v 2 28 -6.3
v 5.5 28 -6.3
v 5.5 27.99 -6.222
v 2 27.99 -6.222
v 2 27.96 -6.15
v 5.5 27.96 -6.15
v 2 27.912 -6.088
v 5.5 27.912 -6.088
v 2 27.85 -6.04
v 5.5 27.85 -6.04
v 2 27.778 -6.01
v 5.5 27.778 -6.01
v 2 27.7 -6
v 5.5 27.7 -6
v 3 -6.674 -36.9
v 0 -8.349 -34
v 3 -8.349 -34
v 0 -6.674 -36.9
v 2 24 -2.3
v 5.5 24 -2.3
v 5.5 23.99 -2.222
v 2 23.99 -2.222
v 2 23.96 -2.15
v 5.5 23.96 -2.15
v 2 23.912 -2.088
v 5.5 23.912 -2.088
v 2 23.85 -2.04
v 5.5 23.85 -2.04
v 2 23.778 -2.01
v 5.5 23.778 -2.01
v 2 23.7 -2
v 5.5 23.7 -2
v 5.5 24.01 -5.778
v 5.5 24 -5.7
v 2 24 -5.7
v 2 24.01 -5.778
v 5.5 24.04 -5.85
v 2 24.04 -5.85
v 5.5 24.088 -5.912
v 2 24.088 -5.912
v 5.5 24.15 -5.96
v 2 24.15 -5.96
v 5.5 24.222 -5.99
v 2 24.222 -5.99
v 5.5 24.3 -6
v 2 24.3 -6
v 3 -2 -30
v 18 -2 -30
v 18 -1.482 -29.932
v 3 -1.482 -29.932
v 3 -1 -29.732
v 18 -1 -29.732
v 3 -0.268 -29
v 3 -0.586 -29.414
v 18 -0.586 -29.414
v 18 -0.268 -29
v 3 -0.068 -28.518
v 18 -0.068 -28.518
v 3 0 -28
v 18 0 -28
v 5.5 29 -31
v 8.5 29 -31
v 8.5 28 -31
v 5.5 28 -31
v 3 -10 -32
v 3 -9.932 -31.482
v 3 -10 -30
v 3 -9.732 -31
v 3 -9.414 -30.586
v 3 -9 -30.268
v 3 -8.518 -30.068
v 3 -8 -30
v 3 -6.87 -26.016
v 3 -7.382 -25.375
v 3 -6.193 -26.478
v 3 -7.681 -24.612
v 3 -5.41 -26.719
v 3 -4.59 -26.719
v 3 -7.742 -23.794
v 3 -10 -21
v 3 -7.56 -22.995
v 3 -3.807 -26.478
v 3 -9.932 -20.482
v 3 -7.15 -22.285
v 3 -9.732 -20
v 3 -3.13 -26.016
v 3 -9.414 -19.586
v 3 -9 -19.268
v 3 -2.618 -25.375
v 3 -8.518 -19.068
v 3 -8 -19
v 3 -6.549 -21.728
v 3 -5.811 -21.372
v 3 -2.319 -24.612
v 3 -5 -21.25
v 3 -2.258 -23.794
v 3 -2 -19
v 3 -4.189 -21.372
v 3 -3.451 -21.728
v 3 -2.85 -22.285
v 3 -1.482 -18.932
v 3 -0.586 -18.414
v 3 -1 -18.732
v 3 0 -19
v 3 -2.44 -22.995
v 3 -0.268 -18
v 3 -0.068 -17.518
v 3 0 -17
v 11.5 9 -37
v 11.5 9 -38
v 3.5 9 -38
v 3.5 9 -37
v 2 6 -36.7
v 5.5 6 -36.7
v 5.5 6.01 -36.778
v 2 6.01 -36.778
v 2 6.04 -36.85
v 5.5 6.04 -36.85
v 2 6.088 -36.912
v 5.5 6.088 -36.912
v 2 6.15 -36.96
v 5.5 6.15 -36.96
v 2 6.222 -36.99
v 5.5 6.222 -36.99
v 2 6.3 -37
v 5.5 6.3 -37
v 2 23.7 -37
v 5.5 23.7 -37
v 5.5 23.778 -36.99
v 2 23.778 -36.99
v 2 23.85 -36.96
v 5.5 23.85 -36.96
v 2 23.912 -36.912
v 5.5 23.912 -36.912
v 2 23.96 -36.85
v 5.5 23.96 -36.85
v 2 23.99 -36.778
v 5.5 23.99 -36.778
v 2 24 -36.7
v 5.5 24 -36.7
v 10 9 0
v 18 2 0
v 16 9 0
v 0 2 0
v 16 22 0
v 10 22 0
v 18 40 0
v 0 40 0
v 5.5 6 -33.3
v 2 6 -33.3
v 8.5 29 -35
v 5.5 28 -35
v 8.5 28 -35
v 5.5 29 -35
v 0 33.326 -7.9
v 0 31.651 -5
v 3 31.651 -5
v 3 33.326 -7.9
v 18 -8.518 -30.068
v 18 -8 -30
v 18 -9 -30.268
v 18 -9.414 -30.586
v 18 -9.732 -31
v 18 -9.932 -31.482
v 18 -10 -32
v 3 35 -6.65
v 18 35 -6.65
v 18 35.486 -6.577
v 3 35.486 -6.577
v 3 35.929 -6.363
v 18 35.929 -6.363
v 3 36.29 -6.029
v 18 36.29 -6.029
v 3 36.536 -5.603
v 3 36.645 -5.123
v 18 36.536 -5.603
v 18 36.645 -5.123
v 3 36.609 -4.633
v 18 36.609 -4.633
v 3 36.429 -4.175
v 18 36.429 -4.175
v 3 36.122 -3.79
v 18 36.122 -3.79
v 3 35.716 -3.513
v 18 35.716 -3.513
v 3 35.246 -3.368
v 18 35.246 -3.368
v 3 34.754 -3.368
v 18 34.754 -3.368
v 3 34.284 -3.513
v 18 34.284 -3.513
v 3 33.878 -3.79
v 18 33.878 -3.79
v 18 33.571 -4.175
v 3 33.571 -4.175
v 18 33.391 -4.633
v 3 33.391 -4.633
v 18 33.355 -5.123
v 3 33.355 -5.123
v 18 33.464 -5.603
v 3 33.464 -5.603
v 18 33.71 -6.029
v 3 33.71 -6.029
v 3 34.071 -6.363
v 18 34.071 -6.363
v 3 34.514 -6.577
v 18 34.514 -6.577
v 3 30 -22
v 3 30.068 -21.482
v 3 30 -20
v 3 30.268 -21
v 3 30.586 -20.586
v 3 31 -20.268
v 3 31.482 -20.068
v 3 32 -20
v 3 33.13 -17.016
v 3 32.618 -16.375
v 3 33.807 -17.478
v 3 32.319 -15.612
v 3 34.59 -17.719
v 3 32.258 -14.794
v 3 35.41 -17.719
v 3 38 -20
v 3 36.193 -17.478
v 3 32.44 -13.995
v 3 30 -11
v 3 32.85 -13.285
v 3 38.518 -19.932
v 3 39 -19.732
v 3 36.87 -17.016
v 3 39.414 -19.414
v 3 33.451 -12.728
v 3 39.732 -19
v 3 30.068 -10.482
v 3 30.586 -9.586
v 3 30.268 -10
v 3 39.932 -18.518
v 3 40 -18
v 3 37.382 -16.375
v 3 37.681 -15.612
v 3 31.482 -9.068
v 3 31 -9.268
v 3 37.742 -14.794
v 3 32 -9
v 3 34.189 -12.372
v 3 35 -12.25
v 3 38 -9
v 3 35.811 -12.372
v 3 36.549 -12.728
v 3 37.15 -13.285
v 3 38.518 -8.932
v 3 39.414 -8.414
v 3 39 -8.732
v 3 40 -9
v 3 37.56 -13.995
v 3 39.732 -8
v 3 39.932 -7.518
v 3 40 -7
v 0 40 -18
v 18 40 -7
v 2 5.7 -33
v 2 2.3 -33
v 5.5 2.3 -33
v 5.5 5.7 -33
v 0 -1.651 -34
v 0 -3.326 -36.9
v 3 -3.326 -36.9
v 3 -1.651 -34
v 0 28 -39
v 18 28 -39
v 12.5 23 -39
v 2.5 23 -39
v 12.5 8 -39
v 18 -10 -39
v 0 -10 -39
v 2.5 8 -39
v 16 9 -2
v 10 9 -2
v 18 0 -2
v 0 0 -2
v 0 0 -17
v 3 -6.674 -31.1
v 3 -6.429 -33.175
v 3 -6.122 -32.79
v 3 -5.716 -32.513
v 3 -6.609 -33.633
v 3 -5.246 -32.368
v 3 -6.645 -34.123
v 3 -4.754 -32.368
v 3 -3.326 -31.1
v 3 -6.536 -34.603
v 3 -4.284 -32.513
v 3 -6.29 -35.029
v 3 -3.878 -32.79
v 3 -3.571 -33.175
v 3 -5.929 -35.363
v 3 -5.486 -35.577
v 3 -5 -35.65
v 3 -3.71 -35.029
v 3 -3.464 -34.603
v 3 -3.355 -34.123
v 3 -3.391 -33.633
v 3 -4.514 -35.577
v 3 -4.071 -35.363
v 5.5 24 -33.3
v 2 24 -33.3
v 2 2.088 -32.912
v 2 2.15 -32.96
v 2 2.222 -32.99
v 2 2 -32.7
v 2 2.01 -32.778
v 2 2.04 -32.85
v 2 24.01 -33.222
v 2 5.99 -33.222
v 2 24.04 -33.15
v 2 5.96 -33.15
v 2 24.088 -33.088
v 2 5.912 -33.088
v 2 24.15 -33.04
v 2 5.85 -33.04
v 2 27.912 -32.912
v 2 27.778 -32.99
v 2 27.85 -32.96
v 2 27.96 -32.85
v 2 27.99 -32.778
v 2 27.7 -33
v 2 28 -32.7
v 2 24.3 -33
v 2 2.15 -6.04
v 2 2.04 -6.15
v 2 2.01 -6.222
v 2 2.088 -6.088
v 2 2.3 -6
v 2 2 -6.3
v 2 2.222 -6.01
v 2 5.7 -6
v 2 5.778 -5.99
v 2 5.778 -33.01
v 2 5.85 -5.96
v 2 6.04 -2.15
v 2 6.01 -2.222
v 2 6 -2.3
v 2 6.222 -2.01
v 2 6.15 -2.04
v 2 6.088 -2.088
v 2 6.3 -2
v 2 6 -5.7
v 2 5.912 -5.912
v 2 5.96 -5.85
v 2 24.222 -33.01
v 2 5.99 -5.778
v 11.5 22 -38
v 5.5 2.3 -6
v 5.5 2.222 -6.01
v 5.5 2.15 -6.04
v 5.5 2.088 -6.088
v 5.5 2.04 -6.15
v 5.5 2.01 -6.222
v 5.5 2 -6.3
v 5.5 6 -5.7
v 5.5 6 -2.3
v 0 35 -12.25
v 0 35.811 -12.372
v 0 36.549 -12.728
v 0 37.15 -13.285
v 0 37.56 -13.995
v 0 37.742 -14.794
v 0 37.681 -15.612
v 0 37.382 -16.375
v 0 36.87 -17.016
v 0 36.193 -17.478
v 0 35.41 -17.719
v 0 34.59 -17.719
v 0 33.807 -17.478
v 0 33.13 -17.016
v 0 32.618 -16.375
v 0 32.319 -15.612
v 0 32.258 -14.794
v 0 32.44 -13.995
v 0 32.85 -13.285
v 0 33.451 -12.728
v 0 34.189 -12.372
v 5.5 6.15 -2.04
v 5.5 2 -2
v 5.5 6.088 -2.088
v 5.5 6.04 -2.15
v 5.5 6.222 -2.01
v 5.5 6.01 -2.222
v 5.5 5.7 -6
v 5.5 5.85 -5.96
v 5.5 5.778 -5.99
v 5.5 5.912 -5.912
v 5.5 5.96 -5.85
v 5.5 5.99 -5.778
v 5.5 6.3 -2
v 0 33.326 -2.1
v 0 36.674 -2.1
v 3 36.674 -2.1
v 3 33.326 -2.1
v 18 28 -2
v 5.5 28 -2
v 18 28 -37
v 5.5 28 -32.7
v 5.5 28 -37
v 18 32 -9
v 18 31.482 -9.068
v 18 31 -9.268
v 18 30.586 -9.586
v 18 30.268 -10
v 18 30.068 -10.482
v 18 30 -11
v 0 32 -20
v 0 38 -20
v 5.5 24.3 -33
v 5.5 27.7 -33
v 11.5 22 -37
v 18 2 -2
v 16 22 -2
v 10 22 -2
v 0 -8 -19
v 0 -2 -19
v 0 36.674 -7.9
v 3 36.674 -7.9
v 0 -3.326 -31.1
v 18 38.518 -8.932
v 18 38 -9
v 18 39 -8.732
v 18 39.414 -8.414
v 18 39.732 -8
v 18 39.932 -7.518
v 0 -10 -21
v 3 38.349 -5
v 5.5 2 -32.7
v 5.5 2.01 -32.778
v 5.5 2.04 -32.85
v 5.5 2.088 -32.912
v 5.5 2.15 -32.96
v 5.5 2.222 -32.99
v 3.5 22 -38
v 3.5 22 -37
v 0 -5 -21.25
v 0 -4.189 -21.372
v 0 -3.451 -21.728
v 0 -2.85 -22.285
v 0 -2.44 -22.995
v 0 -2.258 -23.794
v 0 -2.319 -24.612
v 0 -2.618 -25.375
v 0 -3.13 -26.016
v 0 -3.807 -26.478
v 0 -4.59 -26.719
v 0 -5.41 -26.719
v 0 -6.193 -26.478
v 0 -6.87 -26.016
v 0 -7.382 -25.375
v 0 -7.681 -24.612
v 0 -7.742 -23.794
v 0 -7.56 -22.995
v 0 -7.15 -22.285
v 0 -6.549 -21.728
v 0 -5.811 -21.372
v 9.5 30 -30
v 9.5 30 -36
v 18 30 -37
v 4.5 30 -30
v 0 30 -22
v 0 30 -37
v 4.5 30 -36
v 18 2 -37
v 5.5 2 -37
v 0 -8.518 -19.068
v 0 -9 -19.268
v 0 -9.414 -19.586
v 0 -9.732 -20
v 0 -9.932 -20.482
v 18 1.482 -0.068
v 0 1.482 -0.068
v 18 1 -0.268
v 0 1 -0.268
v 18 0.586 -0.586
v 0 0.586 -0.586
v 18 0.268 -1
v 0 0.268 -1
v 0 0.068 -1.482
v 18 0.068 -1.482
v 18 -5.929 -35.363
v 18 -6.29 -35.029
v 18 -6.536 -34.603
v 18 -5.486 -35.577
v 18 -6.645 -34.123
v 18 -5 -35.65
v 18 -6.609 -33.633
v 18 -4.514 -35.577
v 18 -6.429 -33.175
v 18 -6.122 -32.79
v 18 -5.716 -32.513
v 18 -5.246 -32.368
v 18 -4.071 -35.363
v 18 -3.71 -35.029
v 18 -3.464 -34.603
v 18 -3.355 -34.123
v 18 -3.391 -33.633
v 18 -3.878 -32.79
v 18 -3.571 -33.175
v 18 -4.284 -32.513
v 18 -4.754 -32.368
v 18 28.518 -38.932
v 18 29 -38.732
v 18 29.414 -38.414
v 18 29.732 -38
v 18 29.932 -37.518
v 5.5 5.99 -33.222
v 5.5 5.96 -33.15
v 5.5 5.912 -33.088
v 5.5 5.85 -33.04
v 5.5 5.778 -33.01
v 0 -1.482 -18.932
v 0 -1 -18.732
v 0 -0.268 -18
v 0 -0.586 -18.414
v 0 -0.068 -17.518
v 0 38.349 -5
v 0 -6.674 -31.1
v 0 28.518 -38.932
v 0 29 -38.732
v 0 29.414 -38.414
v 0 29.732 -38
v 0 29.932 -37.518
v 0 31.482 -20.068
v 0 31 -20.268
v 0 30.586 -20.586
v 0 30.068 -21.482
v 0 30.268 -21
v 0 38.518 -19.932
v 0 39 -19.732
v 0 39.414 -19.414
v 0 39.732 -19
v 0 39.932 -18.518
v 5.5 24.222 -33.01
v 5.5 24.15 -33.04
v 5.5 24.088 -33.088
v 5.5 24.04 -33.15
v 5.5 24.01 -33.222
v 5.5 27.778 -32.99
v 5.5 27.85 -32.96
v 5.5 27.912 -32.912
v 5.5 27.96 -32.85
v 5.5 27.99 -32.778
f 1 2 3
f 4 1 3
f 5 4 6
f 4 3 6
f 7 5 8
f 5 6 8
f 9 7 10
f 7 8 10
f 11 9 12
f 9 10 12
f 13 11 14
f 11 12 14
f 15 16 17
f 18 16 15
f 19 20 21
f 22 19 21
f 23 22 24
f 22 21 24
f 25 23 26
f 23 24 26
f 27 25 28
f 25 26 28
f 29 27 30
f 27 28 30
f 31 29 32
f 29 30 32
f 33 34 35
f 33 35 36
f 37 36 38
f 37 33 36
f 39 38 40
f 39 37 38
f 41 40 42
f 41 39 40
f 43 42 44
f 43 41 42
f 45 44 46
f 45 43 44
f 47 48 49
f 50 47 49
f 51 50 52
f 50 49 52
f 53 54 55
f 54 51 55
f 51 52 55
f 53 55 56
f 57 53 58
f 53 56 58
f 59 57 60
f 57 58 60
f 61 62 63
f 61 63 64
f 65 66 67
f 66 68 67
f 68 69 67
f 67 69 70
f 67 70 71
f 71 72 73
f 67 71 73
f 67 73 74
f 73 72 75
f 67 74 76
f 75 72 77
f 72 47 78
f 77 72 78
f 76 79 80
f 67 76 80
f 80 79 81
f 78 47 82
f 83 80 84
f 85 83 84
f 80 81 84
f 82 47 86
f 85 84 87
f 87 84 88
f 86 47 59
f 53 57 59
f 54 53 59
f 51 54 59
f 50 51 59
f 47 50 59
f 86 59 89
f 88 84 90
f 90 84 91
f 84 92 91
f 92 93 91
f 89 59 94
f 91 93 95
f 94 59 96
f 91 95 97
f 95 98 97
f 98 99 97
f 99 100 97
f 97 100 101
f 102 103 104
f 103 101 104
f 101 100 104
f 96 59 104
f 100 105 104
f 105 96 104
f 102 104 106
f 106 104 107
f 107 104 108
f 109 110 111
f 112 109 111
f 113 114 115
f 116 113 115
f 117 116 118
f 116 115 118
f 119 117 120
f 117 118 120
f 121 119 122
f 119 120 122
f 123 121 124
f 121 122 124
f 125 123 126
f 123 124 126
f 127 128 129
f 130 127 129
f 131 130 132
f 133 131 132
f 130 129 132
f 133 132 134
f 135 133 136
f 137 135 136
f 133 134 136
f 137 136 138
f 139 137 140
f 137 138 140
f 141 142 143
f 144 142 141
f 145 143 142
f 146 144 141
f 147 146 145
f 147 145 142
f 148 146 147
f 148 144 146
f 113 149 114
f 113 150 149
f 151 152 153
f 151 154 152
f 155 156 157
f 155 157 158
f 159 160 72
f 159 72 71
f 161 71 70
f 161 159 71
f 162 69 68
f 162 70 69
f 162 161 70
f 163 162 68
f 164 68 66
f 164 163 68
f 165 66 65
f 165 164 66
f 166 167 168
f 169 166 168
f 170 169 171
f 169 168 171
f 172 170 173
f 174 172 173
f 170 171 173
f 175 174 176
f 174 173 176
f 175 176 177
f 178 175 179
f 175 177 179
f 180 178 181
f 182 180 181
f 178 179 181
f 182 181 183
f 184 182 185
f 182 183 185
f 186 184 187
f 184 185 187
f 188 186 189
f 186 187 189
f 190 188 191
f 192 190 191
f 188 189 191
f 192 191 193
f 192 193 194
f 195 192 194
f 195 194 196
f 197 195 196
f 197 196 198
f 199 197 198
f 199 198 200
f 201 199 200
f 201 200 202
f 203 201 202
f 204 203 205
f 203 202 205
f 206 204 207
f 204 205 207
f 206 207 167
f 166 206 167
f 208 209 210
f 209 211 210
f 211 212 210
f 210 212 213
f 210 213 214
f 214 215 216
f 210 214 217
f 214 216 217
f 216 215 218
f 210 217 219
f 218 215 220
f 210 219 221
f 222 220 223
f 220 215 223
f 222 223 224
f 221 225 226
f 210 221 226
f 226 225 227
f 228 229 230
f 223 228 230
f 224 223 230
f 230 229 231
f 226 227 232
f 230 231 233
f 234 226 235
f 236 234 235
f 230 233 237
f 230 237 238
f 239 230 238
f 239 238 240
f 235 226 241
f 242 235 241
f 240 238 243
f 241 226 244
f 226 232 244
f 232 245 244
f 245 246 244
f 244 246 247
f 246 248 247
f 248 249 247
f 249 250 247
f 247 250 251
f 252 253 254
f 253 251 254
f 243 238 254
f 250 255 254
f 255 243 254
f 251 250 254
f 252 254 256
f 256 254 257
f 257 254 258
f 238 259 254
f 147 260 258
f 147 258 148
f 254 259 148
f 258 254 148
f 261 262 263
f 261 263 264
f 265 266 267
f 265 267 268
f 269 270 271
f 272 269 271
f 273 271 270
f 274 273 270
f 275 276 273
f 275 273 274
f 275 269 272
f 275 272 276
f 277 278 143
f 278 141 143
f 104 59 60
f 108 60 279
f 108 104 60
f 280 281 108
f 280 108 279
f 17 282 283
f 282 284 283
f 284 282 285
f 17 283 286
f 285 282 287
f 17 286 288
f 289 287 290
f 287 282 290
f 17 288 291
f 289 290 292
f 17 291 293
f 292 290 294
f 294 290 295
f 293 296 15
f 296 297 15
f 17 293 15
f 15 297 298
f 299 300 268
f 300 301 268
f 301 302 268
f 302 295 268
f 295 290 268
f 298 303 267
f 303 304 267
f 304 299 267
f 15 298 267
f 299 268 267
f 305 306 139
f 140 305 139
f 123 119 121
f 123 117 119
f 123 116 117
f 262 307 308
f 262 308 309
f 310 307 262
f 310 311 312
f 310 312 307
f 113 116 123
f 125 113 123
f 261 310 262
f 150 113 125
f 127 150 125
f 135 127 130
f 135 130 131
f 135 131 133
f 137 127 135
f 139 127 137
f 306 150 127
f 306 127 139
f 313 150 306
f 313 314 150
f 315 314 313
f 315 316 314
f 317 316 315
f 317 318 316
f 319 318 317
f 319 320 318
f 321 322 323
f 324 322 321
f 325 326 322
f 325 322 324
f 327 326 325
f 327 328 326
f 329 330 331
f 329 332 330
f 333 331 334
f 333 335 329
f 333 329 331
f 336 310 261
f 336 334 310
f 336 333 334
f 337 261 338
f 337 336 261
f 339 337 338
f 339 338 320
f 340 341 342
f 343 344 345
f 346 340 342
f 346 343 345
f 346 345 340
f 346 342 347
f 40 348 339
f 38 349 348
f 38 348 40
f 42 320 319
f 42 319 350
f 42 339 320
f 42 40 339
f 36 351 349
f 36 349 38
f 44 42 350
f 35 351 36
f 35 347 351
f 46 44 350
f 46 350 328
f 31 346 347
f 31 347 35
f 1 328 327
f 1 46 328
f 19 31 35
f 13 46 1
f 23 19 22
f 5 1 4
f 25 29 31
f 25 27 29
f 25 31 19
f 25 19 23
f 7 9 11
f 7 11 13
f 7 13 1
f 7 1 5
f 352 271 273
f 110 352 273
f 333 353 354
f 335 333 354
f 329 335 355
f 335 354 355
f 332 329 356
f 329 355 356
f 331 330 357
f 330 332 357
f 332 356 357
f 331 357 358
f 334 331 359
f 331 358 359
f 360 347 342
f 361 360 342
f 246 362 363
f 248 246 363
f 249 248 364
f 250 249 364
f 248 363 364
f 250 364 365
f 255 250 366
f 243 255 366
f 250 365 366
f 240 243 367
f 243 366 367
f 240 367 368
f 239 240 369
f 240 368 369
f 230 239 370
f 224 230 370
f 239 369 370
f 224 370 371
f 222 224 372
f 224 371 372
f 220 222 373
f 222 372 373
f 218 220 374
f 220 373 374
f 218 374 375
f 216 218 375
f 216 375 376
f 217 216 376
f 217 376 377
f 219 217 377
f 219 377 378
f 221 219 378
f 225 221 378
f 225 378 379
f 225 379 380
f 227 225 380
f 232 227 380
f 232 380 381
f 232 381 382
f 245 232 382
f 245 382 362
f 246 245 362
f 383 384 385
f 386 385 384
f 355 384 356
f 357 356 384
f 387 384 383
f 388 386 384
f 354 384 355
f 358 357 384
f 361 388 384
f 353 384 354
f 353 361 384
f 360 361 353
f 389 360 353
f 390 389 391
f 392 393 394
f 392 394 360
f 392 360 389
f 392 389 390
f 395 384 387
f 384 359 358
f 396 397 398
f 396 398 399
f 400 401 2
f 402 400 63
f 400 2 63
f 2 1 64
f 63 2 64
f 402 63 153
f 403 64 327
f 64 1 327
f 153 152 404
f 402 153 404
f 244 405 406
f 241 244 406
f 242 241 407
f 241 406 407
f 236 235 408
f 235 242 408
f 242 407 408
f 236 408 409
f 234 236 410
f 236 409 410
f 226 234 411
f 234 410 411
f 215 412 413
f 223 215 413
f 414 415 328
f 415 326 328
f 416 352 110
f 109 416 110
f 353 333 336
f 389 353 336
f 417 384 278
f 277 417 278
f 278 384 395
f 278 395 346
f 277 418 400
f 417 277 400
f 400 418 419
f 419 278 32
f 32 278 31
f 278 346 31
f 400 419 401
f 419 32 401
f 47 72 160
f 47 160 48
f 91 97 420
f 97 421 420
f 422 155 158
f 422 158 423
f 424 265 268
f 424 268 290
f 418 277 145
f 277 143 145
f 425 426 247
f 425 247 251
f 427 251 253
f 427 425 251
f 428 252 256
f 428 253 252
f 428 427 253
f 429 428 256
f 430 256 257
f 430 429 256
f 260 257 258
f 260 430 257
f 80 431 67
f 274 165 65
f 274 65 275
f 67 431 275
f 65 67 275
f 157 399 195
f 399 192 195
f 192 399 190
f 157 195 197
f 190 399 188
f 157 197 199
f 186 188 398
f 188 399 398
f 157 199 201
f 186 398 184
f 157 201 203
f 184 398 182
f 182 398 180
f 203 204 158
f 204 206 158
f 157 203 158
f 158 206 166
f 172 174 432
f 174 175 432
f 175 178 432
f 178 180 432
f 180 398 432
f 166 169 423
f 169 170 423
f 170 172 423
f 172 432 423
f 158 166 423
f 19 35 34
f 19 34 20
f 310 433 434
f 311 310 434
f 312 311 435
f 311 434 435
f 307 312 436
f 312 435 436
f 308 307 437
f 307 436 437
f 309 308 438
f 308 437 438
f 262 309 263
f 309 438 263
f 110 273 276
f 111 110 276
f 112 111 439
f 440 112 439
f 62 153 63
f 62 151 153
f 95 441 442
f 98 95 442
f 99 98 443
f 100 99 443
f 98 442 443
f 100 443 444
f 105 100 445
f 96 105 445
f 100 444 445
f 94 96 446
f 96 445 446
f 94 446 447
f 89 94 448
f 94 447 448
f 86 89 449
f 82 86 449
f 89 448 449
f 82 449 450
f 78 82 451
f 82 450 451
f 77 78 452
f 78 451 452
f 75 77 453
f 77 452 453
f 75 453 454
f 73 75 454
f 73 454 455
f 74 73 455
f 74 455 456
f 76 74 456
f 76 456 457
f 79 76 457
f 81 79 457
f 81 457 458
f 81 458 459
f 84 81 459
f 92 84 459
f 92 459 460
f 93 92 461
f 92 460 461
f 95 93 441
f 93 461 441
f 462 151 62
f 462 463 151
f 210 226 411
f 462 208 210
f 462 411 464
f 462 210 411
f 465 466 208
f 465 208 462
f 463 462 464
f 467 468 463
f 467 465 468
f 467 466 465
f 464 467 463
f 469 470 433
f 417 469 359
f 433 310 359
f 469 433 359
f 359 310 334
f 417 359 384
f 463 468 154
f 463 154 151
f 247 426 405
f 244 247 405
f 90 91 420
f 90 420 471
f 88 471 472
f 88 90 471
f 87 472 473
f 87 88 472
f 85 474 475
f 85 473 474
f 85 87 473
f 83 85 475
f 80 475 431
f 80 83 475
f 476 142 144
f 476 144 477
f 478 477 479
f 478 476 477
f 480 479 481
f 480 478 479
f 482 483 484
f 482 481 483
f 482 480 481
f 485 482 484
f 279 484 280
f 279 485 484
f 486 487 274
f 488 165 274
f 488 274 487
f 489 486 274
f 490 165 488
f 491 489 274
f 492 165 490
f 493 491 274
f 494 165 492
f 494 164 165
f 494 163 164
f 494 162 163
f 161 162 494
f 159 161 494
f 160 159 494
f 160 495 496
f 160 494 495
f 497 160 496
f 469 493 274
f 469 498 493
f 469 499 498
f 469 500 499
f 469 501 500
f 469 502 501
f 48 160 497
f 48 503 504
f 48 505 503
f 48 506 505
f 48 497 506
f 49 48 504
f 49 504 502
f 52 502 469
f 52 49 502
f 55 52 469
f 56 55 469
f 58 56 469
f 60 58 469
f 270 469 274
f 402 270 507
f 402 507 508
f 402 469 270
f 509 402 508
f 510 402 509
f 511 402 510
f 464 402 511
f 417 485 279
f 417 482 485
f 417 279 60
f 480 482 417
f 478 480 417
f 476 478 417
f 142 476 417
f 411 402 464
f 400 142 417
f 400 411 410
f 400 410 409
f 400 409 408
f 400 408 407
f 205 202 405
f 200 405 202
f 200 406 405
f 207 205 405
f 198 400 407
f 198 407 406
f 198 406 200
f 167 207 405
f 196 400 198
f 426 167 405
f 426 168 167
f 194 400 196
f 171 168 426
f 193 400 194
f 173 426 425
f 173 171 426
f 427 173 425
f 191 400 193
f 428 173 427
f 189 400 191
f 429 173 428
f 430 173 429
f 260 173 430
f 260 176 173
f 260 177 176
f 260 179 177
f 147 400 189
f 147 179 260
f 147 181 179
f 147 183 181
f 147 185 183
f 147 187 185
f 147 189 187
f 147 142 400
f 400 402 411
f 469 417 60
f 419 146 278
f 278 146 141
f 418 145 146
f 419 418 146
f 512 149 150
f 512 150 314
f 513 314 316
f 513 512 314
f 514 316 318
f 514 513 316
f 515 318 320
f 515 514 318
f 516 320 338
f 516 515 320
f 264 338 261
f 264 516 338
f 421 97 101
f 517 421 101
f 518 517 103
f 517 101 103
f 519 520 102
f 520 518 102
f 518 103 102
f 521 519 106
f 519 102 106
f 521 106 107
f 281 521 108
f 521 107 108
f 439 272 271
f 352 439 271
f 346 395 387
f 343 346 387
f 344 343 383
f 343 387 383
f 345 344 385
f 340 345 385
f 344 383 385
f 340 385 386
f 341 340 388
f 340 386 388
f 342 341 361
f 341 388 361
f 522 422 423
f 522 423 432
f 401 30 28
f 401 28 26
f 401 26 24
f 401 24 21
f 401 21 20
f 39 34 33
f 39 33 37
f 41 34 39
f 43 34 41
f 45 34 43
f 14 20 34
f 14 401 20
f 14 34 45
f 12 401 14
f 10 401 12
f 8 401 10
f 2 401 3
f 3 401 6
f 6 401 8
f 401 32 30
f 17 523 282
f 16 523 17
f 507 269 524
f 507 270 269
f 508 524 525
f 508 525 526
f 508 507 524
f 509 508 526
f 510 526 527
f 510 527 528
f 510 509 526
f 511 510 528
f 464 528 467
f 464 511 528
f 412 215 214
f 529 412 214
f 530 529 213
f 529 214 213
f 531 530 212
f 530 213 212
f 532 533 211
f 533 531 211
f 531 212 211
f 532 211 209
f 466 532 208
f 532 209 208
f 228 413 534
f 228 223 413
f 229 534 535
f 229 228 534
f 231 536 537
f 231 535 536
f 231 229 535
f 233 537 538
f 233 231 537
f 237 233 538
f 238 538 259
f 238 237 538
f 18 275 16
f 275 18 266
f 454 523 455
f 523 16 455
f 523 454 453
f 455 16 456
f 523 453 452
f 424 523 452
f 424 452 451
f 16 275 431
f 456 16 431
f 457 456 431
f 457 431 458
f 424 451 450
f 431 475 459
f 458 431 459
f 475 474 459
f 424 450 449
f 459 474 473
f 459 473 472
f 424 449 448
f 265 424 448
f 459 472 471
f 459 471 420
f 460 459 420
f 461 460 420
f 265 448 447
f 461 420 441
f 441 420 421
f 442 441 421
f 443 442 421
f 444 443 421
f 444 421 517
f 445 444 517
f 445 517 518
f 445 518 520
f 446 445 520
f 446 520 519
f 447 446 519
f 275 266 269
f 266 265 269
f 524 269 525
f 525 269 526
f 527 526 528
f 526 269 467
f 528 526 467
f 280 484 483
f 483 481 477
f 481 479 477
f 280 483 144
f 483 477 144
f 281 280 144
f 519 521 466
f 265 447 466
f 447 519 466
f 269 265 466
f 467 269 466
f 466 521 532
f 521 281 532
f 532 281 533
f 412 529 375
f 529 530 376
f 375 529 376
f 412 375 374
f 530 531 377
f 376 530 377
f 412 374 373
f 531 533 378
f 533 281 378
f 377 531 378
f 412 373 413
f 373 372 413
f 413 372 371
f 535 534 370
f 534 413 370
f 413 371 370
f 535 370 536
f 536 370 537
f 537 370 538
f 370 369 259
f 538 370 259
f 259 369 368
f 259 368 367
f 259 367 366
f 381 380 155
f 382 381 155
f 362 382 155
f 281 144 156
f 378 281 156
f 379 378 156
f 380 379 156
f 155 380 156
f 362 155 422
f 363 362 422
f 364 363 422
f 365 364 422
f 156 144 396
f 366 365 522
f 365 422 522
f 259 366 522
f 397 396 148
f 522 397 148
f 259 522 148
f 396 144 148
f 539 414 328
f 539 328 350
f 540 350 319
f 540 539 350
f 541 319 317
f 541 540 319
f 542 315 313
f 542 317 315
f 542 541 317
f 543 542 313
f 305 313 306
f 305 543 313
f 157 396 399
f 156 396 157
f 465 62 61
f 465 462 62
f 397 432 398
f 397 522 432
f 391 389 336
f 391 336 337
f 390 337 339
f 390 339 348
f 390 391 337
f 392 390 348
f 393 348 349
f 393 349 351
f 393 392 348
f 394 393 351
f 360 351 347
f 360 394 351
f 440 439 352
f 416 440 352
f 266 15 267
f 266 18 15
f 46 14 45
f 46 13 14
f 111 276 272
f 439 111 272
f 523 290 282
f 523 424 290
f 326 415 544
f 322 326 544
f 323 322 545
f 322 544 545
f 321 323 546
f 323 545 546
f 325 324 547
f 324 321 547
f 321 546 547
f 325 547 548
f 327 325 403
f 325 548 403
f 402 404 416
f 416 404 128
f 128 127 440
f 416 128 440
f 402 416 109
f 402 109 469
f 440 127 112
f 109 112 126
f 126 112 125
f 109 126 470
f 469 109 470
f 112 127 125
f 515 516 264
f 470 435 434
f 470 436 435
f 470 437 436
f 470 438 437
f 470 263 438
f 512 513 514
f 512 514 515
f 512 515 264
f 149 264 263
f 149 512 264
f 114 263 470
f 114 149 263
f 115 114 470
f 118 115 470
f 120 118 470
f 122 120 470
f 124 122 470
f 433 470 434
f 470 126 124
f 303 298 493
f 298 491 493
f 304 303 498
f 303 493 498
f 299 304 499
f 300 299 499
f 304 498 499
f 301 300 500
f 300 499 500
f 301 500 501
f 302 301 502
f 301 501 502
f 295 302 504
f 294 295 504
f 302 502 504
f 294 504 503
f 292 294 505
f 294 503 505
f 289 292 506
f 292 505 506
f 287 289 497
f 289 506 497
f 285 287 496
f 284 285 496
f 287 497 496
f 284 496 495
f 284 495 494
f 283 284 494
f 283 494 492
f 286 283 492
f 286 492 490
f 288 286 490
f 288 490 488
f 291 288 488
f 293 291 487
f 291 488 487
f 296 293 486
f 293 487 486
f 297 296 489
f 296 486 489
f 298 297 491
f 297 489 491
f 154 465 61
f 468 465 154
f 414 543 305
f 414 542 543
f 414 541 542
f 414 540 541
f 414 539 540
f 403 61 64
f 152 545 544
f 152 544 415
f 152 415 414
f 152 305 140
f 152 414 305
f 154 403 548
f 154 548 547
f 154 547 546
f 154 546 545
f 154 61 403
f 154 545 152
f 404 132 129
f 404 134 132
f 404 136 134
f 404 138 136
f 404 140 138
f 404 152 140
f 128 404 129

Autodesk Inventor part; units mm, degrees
ref_plane "YZ Plane" through (0, 0, 0) normal (1, 0, 0) x (0, 1, 0)
ref_plane "XZ Plane" through (0, 0, 0) normal (0, 1, 0) x (-1, 0, 0)
ref_plane "XY Plane" through (0, 0, 0) normal (0, 0, 1) x (1, 0, 0)
sketch "Skizze1" plane through (0, 0, 0) normal (1, 0, 0) x (0, 1, 0)
  line L0 (0, 0) -> (30, 0)
  line L1 (30, 0) -> (30, -39)
  line L2 (30, -39) -> (0, -39)
  line L3 (0, -39) -> (0, 0)
  dimension "d0" = 39
  dimension "d1" = 30
extrude "Extrusion1" add sketch "Skizze1" along normal blind 18
shell "Wandung1" thickness 2 removed faces 1 at (18, 10, -13)
sketch "Skizze2" plane through (2, 2, -37) normal (1, 0, 0) x (0, 0, -1)
  line L0 (-35, 26) -> (-35, 0) projected
  line L1 (-35, 26) -> (-31, 26)
  line L2 (-31, 26) -> (-31, 22)
  line L3 (-31, 22) -> (-35, 22)
  line L4 (-35, 22) -> (-35, 26)
  line L5 (0, 26) -> (0, 0) projected
  line L6 (0, 26) -> (-4, 26)
  line L7 (-4, 26) -> (-4, 22)
  line L8 (-4, 22) -> (0, 22)
  line L9 (0, 22) -> (0, 26)
  line L10 (0, 0) -> (-4, 0)
  line L11 (-4, 0) -> (-4, 4)
  line L12 (-4, 4) -> (0, 4)
  line L13 (0, 4) -> (0, 0)
  line L14 (-35, 0) -> (0, 0) projected
  line L15 (-35, 0) -> (-31, 0)
  line L16 (-31, 0) -> (-31, 4)
  line L17 (-31, 4) -> (-35, 4)
  line L18 (-35, 4) -> (-35, 0)
  point P0 (-37, -2)
  point P1 (-35, 4)
  point P2 (-31, 0)
  point P3 (0, 4)
  point P4 (0, 22)
  dimension "d5" = 4
  dimension "d6" = 4
  dimension "d7" = 4
  dimension "d8" = 4
extrude "Extrusion2" add sketch "Skizze2" along normal blind 3.5
fillet "Rundung1" radius 0.3 12 edges at (3.75, 24, -6) (3.75, 24, -2) (3.75, 28, -6) (3.75, 28, -33) (3.75, 24, -33) (3.75, 24, -37) (3.75, 6, -37) (3.75, 6, -33) (3.75, 2, -33) (3.75, 6, -2) (3.75, 6, -6) (3.75, 2, -6)
sketch "Skizze3" plane through (0, 0, -39) normal (0, 0, -1) x (-1, 0, 0)
  line L0 (-10.5, 20) -> (-6.5, 20)
  line L1 (-6.5, 20) -> (-6.5, 11)
  line L2 (-6.5, 11) -> (-10.5, 11)
  line L3 (-10.5, 11) -> (-10.5, 20)
  line L4 (0, 30) -> (-18, 30) projected
  line L5 (0, 0) -> (-18, 0) projected
  line L6 (0, 0) -> (0, 30) projected
  dimension "d12" = 9
  dimension "d13" = 4
  dimension "d15" = 11
  dimension "d16" = 6.5
extrude "Extrusion3" cut sketch "Skizze3" against normal blind 3.5
sketch "Skizze4" plane through (0, 0, -39) normal (0, 0, -1) x (-1, 0, 0)
  line L0 (-11.5, 9) -> (-3.5, 9)
  line L1 (-3.5, 9) -> (-3.5, 22)
  line L2 (-3.5, 22) -> (-11.5, 22)
  line L3 (-11.5, 22) -> (-11.5, 9)
  line L4 (-10.5, 11) -> (-10.5, 20) projected
  line L5 (-6.5, 11) -> (-10.5, 11) projected
  point P0 (0, 0)
  dimension "d19" = 1
  dimension "d20" = 8
  dimension "d21" = 13
  dimension "d22" = 2
extrude "Extrusion4" cut sketch "Skizze4" against normal blind 2
sketch "Skizze5" plane through (0, 0, 0) normal (0, 0, 1) x (1, 0, 0)
  line L0 (16, 22) -> (10, 22)
  line L1 (10, 22) -> (10, 9)
  line L2 (10, 9) -> (16, 9)
  line L3 (16, 9) -> (16, 22)
  line L4 (18, 30) -> (18, 0) projected
  line L5 (0, 30) -> (18, 30) projected
  point P0 (0, 0)
  dimension "d25" = 13
  dimension "d26" = 6
  dimension "d27" = 2
  dimension "d28" = 8
extrude "Extrusion5" cut sketch "Skizze5" against normal blind 2
sketch "Skizze6" plane through (0, 30, 0) normal (0, 1, 0) x (1, 0, 0)
  line L0 (8.5, 31) -> (5.5, 31)
  line L1 (5.5, 31) -> (5.5, 35)
  line L2 (5.5, 35) -> (8.5, 35)
  line L3 (8.5, 35) -> (8.5, 31)
  line L4 (0, 39) -> (18, 39) projected
  line L5 (0, 39) -> (0, 0) projected
  dimension "d31" = 3
  dimension "d32" = 4
  dimension "d33" = 4
  dimension "d34" = 5.5
extrude "Extrusion6" cut sketch "Skizze6" against normal blind 2
chamfer "Fase1" distance 1 angle 45 4 edges at (5.5, 30, -33) (7, 30, -31) (7, 30, -35) (8.5, 30, -33)
chamfer "Fase2" distance 1 angle 45 4 edges at (3.5, 15.5, -39) (7.5, 9, -39) (11.5, 15.5, -39) (7.5, 22, -39)
sketch "Skizze7" plane through (0, 0, 0) normal (-1, 0, 0) x (0, 0, 1)
  line L0 (0, 0) -> (-39, 0) projected
  line L1 (-39, 30) -> (0, 30) projected
  line L2 (0, 30) -> (-20, 30)
  line L3 (-20, 30) -> (-20, 40)
  line L4 (-20, 40) -> (0, 40)
  line L5 (0, 40) -> (0, 30)
  line L6 (-39, 0) -> (-19, 0)
  line L7 (-19, 0) -> (-19, -10)
  line L8 (-19, -10) -> (-39, -10)
  line L9 (-39, -10) -> (-39, 0)
  dimension "d43" = 10
  dimension "d44" = 20
  dimension "d45" = 20
  dimension "d46" = 10
extrude "Extrusion7" add sketch "Skizze7" against normal blind 3
sketch "Skizze8" plane through (0, 0, 0) normal (-1, 0, 0) x (0, 0, 1)
  line L0 (-2.1, 36.6743) -> (-2.1, 33.3257)
  line L1 (-2.1, 33.3257) -> (-5, 31.6514)
  line L2 (-5, 31.6514) -> (-7.9, 33.3257)
  line L3 (-7.9, 33.3257) -> (-7.9, 36.6743)
  line L4 (-7.9, 36.6743) -> (-5, 38.3486)
  line L5 (-5, 38.3486) -> (-2.1, 36.6743)
  line L6 (-31.1, -6.6743) -> (-34, -8.3486)
  line L7 (-34, -8.3486) -> (-36.9, -6.6743)
  line L8 (-36.9, -6.6743) -> (-36.9, -3.3257)
  line L9 (-36.9, -3.3257) -> (-34, -1.6514)
  line L10 (-34, -1.6514) -> (-31.1, -3.3257)
  line L11 (-31.1, -3.3257) -> (-31.1, -6.6743)
  line L12 (0, 0) -> (0, 40) projected
  line L13 (0, 40) -> (-20, 40) projected
  line L14 (-39, -10) -> (-39, 30) projected
  line L15 (-39, -10) -> (-19, -10) projected
  circle A0 centre (-24, -5) radius 2.75
  circle A1 centre (-15, 35) radius 2.75
  line L16 (-19, -10) -> (-19, 0) projected
  line L17 (-20, 40) -> (-20, 30) projected
  point P0 (-5, 35)
  point P1 (-34, -5)
  dimension "d49" = 5.8
  dimension "d50" = 5
  dimension "d51" = 5
  dimension "d52" = 5
  dimension "d53" = 5.8
  dimension "d54" = 5
  dimension "d57" = 5.5
  dimension "d58" = 5
  dimension "d59" = 5
  dimension "d60" = 5
  dimension "d61" = 5
extrude "Extrusion8" cut sketch "Skizze8" against normal blind 3
sketch "Skizze9" plane through (3, 0, 0) normal (1, 0, 0) x (0, 0, -1)
  line L0 (19, 0) -> (39, 0) projected
  line L1 (39, -10) -> (30, -10)
  line L2 (30, -10) -> (30, 0)
  line L3 (30, 0) -> (39, 0)
  line L4 (39, 0) -> (39, -10)
  line L5 (19, -10) -> (39, -10) projected
  line L6 (0, 0) -> (0, 40) projected
  line L7 (39, 30) -> (0, 30) projected
  line L8 (0, 40) -> (9, 40)
  line L9 (9, 40) -> (9, 30)
  line L10 (9, 30) -> (0, 30)
  line L11 (0, 30) -> (0, 40)
  line L12 (39, -10) -> (39, 0) projected
  dimension "d62" = 9
  dimension "d63" = 9
extrude "Extrusion9" add sketch "Skizze9" along normal blind 15
sketch "Skizze10" plane through (18, 0, 0) normal (1, 0, 0) x (0, 0, -1)
  circle A0 centre (34, -5) radius 1.65
  line L0 (39, -10) -> (39, 30) projected
  line L1 (30, -10) -> (39, -10) projected
  circle A1 centre (5, 35) radius 1.65
  line L2 (0, 40) -> (0, 0) projected
  line L3 (9, 40) -> (0, 40) projected
  dimension "d66" = 5
  dimension "d67" = 3.3
  dimension "d68" = 5
  dimension "d69" = 5
  dimension "d70" = 5
  dimension "d71" = 3.3
extrude "Extrusion10" cut sketch "Skizze10" against normal blind 19
fillet "Rundung2" radius 2 10 edges at (9, 0, 0) (9, 30, -39) (10.5, -10, -30) (1.5, -10, -19) (1.5, 0, -19) (1.5, 30, -20) (1.5, 40, -20) (10.5, 40, -9) (10.5, 0, -30) (10.5, 30, -9)
properties part number "gehaeuse_wemos"
